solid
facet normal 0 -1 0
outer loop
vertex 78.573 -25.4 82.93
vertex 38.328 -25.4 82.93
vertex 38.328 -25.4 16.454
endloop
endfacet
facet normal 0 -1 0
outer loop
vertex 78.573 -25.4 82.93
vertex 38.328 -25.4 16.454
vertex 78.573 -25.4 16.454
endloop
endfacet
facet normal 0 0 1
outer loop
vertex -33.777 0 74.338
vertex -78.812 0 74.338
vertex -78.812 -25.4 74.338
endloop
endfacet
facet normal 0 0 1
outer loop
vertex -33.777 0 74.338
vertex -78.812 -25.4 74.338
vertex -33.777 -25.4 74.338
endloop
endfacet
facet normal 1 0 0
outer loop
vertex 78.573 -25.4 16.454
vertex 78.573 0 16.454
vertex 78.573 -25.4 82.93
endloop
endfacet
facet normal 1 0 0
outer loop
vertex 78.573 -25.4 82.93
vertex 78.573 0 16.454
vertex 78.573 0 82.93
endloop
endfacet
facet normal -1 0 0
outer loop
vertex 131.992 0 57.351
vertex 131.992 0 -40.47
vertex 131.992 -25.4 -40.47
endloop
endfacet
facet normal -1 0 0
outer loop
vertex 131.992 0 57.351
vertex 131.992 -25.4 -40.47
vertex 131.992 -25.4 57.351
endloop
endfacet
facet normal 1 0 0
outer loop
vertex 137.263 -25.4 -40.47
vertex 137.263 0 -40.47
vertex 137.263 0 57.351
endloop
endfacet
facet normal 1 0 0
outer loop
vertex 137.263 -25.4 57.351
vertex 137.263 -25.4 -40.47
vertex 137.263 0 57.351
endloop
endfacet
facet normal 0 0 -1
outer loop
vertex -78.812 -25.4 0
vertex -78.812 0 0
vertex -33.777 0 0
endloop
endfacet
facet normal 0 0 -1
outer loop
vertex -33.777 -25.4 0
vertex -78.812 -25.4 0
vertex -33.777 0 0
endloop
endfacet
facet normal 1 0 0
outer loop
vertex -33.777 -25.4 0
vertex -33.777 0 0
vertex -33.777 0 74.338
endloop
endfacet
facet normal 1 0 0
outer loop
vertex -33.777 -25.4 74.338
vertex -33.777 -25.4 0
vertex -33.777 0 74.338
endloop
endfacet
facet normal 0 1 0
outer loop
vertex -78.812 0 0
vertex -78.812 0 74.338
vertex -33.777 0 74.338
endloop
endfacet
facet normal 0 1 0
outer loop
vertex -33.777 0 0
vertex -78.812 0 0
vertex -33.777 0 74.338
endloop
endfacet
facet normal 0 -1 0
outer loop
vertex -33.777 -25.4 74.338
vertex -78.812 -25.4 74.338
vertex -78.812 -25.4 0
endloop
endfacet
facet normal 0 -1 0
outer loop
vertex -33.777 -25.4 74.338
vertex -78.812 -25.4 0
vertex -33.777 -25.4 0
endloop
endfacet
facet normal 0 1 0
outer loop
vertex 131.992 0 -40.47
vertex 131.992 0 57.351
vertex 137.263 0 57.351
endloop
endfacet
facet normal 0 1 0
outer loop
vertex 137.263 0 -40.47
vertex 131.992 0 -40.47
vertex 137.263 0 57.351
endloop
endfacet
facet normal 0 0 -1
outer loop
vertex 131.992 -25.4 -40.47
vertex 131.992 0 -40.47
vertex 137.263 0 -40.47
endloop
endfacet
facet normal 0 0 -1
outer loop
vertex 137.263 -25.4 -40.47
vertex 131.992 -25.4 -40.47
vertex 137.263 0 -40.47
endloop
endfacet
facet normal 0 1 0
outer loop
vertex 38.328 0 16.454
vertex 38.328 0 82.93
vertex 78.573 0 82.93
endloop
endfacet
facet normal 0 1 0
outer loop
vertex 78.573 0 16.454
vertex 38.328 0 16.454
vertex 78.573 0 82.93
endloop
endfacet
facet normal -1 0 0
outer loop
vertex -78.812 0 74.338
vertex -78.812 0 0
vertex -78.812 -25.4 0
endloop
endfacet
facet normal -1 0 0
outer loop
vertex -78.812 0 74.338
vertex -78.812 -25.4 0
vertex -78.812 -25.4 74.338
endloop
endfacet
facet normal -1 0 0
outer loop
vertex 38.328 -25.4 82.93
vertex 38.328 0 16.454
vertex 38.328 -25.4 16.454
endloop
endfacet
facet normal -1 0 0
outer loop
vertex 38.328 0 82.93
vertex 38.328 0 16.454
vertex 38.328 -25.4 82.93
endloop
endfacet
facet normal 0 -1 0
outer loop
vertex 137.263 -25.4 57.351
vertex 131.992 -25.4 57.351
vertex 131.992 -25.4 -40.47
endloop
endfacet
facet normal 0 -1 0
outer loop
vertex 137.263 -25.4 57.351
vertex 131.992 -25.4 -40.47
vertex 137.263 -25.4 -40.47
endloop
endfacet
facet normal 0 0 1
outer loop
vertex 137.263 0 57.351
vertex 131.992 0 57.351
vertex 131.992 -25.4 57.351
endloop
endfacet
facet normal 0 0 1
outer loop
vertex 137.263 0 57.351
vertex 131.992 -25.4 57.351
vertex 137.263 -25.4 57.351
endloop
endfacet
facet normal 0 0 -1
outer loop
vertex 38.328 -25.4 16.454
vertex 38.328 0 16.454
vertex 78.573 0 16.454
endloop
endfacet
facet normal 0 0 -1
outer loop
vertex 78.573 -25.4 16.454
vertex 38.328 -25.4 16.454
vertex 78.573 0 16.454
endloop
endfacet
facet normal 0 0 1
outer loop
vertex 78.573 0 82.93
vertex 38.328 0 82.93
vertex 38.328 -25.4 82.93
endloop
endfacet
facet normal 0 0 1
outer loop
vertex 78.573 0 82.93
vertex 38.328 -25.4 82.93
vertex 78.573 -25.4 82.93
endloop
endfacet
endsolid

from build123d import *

# Parameters (mm, degrees)
F0_W     = 45.035556
F0_H     = 74.338078
F0_W_2   = 40.24455
F0_H_2   = 66.475965
F0_W_3   = 5.270094
F0_H_3   = 97.820796
F1_DEPTH = 25.4


with BuildPart() as f1:
    # F0 (on Front) → F1 (new body)
    with BuildSketch(Plane.XZ):
        with Locations((-56.294464, 37.169039)):
            Rectangle(F0_W, F0_H)
        with Locations((58.450371, 49.691637)):
            Rectangle(F0_W_2, F0_H_2)
        with Locations((134.627536, 8.440673)):
            Rectangle(F0_W_3, F0_H_3)
    extrude(amount=F1_DEPTH)


solid = f1.part
